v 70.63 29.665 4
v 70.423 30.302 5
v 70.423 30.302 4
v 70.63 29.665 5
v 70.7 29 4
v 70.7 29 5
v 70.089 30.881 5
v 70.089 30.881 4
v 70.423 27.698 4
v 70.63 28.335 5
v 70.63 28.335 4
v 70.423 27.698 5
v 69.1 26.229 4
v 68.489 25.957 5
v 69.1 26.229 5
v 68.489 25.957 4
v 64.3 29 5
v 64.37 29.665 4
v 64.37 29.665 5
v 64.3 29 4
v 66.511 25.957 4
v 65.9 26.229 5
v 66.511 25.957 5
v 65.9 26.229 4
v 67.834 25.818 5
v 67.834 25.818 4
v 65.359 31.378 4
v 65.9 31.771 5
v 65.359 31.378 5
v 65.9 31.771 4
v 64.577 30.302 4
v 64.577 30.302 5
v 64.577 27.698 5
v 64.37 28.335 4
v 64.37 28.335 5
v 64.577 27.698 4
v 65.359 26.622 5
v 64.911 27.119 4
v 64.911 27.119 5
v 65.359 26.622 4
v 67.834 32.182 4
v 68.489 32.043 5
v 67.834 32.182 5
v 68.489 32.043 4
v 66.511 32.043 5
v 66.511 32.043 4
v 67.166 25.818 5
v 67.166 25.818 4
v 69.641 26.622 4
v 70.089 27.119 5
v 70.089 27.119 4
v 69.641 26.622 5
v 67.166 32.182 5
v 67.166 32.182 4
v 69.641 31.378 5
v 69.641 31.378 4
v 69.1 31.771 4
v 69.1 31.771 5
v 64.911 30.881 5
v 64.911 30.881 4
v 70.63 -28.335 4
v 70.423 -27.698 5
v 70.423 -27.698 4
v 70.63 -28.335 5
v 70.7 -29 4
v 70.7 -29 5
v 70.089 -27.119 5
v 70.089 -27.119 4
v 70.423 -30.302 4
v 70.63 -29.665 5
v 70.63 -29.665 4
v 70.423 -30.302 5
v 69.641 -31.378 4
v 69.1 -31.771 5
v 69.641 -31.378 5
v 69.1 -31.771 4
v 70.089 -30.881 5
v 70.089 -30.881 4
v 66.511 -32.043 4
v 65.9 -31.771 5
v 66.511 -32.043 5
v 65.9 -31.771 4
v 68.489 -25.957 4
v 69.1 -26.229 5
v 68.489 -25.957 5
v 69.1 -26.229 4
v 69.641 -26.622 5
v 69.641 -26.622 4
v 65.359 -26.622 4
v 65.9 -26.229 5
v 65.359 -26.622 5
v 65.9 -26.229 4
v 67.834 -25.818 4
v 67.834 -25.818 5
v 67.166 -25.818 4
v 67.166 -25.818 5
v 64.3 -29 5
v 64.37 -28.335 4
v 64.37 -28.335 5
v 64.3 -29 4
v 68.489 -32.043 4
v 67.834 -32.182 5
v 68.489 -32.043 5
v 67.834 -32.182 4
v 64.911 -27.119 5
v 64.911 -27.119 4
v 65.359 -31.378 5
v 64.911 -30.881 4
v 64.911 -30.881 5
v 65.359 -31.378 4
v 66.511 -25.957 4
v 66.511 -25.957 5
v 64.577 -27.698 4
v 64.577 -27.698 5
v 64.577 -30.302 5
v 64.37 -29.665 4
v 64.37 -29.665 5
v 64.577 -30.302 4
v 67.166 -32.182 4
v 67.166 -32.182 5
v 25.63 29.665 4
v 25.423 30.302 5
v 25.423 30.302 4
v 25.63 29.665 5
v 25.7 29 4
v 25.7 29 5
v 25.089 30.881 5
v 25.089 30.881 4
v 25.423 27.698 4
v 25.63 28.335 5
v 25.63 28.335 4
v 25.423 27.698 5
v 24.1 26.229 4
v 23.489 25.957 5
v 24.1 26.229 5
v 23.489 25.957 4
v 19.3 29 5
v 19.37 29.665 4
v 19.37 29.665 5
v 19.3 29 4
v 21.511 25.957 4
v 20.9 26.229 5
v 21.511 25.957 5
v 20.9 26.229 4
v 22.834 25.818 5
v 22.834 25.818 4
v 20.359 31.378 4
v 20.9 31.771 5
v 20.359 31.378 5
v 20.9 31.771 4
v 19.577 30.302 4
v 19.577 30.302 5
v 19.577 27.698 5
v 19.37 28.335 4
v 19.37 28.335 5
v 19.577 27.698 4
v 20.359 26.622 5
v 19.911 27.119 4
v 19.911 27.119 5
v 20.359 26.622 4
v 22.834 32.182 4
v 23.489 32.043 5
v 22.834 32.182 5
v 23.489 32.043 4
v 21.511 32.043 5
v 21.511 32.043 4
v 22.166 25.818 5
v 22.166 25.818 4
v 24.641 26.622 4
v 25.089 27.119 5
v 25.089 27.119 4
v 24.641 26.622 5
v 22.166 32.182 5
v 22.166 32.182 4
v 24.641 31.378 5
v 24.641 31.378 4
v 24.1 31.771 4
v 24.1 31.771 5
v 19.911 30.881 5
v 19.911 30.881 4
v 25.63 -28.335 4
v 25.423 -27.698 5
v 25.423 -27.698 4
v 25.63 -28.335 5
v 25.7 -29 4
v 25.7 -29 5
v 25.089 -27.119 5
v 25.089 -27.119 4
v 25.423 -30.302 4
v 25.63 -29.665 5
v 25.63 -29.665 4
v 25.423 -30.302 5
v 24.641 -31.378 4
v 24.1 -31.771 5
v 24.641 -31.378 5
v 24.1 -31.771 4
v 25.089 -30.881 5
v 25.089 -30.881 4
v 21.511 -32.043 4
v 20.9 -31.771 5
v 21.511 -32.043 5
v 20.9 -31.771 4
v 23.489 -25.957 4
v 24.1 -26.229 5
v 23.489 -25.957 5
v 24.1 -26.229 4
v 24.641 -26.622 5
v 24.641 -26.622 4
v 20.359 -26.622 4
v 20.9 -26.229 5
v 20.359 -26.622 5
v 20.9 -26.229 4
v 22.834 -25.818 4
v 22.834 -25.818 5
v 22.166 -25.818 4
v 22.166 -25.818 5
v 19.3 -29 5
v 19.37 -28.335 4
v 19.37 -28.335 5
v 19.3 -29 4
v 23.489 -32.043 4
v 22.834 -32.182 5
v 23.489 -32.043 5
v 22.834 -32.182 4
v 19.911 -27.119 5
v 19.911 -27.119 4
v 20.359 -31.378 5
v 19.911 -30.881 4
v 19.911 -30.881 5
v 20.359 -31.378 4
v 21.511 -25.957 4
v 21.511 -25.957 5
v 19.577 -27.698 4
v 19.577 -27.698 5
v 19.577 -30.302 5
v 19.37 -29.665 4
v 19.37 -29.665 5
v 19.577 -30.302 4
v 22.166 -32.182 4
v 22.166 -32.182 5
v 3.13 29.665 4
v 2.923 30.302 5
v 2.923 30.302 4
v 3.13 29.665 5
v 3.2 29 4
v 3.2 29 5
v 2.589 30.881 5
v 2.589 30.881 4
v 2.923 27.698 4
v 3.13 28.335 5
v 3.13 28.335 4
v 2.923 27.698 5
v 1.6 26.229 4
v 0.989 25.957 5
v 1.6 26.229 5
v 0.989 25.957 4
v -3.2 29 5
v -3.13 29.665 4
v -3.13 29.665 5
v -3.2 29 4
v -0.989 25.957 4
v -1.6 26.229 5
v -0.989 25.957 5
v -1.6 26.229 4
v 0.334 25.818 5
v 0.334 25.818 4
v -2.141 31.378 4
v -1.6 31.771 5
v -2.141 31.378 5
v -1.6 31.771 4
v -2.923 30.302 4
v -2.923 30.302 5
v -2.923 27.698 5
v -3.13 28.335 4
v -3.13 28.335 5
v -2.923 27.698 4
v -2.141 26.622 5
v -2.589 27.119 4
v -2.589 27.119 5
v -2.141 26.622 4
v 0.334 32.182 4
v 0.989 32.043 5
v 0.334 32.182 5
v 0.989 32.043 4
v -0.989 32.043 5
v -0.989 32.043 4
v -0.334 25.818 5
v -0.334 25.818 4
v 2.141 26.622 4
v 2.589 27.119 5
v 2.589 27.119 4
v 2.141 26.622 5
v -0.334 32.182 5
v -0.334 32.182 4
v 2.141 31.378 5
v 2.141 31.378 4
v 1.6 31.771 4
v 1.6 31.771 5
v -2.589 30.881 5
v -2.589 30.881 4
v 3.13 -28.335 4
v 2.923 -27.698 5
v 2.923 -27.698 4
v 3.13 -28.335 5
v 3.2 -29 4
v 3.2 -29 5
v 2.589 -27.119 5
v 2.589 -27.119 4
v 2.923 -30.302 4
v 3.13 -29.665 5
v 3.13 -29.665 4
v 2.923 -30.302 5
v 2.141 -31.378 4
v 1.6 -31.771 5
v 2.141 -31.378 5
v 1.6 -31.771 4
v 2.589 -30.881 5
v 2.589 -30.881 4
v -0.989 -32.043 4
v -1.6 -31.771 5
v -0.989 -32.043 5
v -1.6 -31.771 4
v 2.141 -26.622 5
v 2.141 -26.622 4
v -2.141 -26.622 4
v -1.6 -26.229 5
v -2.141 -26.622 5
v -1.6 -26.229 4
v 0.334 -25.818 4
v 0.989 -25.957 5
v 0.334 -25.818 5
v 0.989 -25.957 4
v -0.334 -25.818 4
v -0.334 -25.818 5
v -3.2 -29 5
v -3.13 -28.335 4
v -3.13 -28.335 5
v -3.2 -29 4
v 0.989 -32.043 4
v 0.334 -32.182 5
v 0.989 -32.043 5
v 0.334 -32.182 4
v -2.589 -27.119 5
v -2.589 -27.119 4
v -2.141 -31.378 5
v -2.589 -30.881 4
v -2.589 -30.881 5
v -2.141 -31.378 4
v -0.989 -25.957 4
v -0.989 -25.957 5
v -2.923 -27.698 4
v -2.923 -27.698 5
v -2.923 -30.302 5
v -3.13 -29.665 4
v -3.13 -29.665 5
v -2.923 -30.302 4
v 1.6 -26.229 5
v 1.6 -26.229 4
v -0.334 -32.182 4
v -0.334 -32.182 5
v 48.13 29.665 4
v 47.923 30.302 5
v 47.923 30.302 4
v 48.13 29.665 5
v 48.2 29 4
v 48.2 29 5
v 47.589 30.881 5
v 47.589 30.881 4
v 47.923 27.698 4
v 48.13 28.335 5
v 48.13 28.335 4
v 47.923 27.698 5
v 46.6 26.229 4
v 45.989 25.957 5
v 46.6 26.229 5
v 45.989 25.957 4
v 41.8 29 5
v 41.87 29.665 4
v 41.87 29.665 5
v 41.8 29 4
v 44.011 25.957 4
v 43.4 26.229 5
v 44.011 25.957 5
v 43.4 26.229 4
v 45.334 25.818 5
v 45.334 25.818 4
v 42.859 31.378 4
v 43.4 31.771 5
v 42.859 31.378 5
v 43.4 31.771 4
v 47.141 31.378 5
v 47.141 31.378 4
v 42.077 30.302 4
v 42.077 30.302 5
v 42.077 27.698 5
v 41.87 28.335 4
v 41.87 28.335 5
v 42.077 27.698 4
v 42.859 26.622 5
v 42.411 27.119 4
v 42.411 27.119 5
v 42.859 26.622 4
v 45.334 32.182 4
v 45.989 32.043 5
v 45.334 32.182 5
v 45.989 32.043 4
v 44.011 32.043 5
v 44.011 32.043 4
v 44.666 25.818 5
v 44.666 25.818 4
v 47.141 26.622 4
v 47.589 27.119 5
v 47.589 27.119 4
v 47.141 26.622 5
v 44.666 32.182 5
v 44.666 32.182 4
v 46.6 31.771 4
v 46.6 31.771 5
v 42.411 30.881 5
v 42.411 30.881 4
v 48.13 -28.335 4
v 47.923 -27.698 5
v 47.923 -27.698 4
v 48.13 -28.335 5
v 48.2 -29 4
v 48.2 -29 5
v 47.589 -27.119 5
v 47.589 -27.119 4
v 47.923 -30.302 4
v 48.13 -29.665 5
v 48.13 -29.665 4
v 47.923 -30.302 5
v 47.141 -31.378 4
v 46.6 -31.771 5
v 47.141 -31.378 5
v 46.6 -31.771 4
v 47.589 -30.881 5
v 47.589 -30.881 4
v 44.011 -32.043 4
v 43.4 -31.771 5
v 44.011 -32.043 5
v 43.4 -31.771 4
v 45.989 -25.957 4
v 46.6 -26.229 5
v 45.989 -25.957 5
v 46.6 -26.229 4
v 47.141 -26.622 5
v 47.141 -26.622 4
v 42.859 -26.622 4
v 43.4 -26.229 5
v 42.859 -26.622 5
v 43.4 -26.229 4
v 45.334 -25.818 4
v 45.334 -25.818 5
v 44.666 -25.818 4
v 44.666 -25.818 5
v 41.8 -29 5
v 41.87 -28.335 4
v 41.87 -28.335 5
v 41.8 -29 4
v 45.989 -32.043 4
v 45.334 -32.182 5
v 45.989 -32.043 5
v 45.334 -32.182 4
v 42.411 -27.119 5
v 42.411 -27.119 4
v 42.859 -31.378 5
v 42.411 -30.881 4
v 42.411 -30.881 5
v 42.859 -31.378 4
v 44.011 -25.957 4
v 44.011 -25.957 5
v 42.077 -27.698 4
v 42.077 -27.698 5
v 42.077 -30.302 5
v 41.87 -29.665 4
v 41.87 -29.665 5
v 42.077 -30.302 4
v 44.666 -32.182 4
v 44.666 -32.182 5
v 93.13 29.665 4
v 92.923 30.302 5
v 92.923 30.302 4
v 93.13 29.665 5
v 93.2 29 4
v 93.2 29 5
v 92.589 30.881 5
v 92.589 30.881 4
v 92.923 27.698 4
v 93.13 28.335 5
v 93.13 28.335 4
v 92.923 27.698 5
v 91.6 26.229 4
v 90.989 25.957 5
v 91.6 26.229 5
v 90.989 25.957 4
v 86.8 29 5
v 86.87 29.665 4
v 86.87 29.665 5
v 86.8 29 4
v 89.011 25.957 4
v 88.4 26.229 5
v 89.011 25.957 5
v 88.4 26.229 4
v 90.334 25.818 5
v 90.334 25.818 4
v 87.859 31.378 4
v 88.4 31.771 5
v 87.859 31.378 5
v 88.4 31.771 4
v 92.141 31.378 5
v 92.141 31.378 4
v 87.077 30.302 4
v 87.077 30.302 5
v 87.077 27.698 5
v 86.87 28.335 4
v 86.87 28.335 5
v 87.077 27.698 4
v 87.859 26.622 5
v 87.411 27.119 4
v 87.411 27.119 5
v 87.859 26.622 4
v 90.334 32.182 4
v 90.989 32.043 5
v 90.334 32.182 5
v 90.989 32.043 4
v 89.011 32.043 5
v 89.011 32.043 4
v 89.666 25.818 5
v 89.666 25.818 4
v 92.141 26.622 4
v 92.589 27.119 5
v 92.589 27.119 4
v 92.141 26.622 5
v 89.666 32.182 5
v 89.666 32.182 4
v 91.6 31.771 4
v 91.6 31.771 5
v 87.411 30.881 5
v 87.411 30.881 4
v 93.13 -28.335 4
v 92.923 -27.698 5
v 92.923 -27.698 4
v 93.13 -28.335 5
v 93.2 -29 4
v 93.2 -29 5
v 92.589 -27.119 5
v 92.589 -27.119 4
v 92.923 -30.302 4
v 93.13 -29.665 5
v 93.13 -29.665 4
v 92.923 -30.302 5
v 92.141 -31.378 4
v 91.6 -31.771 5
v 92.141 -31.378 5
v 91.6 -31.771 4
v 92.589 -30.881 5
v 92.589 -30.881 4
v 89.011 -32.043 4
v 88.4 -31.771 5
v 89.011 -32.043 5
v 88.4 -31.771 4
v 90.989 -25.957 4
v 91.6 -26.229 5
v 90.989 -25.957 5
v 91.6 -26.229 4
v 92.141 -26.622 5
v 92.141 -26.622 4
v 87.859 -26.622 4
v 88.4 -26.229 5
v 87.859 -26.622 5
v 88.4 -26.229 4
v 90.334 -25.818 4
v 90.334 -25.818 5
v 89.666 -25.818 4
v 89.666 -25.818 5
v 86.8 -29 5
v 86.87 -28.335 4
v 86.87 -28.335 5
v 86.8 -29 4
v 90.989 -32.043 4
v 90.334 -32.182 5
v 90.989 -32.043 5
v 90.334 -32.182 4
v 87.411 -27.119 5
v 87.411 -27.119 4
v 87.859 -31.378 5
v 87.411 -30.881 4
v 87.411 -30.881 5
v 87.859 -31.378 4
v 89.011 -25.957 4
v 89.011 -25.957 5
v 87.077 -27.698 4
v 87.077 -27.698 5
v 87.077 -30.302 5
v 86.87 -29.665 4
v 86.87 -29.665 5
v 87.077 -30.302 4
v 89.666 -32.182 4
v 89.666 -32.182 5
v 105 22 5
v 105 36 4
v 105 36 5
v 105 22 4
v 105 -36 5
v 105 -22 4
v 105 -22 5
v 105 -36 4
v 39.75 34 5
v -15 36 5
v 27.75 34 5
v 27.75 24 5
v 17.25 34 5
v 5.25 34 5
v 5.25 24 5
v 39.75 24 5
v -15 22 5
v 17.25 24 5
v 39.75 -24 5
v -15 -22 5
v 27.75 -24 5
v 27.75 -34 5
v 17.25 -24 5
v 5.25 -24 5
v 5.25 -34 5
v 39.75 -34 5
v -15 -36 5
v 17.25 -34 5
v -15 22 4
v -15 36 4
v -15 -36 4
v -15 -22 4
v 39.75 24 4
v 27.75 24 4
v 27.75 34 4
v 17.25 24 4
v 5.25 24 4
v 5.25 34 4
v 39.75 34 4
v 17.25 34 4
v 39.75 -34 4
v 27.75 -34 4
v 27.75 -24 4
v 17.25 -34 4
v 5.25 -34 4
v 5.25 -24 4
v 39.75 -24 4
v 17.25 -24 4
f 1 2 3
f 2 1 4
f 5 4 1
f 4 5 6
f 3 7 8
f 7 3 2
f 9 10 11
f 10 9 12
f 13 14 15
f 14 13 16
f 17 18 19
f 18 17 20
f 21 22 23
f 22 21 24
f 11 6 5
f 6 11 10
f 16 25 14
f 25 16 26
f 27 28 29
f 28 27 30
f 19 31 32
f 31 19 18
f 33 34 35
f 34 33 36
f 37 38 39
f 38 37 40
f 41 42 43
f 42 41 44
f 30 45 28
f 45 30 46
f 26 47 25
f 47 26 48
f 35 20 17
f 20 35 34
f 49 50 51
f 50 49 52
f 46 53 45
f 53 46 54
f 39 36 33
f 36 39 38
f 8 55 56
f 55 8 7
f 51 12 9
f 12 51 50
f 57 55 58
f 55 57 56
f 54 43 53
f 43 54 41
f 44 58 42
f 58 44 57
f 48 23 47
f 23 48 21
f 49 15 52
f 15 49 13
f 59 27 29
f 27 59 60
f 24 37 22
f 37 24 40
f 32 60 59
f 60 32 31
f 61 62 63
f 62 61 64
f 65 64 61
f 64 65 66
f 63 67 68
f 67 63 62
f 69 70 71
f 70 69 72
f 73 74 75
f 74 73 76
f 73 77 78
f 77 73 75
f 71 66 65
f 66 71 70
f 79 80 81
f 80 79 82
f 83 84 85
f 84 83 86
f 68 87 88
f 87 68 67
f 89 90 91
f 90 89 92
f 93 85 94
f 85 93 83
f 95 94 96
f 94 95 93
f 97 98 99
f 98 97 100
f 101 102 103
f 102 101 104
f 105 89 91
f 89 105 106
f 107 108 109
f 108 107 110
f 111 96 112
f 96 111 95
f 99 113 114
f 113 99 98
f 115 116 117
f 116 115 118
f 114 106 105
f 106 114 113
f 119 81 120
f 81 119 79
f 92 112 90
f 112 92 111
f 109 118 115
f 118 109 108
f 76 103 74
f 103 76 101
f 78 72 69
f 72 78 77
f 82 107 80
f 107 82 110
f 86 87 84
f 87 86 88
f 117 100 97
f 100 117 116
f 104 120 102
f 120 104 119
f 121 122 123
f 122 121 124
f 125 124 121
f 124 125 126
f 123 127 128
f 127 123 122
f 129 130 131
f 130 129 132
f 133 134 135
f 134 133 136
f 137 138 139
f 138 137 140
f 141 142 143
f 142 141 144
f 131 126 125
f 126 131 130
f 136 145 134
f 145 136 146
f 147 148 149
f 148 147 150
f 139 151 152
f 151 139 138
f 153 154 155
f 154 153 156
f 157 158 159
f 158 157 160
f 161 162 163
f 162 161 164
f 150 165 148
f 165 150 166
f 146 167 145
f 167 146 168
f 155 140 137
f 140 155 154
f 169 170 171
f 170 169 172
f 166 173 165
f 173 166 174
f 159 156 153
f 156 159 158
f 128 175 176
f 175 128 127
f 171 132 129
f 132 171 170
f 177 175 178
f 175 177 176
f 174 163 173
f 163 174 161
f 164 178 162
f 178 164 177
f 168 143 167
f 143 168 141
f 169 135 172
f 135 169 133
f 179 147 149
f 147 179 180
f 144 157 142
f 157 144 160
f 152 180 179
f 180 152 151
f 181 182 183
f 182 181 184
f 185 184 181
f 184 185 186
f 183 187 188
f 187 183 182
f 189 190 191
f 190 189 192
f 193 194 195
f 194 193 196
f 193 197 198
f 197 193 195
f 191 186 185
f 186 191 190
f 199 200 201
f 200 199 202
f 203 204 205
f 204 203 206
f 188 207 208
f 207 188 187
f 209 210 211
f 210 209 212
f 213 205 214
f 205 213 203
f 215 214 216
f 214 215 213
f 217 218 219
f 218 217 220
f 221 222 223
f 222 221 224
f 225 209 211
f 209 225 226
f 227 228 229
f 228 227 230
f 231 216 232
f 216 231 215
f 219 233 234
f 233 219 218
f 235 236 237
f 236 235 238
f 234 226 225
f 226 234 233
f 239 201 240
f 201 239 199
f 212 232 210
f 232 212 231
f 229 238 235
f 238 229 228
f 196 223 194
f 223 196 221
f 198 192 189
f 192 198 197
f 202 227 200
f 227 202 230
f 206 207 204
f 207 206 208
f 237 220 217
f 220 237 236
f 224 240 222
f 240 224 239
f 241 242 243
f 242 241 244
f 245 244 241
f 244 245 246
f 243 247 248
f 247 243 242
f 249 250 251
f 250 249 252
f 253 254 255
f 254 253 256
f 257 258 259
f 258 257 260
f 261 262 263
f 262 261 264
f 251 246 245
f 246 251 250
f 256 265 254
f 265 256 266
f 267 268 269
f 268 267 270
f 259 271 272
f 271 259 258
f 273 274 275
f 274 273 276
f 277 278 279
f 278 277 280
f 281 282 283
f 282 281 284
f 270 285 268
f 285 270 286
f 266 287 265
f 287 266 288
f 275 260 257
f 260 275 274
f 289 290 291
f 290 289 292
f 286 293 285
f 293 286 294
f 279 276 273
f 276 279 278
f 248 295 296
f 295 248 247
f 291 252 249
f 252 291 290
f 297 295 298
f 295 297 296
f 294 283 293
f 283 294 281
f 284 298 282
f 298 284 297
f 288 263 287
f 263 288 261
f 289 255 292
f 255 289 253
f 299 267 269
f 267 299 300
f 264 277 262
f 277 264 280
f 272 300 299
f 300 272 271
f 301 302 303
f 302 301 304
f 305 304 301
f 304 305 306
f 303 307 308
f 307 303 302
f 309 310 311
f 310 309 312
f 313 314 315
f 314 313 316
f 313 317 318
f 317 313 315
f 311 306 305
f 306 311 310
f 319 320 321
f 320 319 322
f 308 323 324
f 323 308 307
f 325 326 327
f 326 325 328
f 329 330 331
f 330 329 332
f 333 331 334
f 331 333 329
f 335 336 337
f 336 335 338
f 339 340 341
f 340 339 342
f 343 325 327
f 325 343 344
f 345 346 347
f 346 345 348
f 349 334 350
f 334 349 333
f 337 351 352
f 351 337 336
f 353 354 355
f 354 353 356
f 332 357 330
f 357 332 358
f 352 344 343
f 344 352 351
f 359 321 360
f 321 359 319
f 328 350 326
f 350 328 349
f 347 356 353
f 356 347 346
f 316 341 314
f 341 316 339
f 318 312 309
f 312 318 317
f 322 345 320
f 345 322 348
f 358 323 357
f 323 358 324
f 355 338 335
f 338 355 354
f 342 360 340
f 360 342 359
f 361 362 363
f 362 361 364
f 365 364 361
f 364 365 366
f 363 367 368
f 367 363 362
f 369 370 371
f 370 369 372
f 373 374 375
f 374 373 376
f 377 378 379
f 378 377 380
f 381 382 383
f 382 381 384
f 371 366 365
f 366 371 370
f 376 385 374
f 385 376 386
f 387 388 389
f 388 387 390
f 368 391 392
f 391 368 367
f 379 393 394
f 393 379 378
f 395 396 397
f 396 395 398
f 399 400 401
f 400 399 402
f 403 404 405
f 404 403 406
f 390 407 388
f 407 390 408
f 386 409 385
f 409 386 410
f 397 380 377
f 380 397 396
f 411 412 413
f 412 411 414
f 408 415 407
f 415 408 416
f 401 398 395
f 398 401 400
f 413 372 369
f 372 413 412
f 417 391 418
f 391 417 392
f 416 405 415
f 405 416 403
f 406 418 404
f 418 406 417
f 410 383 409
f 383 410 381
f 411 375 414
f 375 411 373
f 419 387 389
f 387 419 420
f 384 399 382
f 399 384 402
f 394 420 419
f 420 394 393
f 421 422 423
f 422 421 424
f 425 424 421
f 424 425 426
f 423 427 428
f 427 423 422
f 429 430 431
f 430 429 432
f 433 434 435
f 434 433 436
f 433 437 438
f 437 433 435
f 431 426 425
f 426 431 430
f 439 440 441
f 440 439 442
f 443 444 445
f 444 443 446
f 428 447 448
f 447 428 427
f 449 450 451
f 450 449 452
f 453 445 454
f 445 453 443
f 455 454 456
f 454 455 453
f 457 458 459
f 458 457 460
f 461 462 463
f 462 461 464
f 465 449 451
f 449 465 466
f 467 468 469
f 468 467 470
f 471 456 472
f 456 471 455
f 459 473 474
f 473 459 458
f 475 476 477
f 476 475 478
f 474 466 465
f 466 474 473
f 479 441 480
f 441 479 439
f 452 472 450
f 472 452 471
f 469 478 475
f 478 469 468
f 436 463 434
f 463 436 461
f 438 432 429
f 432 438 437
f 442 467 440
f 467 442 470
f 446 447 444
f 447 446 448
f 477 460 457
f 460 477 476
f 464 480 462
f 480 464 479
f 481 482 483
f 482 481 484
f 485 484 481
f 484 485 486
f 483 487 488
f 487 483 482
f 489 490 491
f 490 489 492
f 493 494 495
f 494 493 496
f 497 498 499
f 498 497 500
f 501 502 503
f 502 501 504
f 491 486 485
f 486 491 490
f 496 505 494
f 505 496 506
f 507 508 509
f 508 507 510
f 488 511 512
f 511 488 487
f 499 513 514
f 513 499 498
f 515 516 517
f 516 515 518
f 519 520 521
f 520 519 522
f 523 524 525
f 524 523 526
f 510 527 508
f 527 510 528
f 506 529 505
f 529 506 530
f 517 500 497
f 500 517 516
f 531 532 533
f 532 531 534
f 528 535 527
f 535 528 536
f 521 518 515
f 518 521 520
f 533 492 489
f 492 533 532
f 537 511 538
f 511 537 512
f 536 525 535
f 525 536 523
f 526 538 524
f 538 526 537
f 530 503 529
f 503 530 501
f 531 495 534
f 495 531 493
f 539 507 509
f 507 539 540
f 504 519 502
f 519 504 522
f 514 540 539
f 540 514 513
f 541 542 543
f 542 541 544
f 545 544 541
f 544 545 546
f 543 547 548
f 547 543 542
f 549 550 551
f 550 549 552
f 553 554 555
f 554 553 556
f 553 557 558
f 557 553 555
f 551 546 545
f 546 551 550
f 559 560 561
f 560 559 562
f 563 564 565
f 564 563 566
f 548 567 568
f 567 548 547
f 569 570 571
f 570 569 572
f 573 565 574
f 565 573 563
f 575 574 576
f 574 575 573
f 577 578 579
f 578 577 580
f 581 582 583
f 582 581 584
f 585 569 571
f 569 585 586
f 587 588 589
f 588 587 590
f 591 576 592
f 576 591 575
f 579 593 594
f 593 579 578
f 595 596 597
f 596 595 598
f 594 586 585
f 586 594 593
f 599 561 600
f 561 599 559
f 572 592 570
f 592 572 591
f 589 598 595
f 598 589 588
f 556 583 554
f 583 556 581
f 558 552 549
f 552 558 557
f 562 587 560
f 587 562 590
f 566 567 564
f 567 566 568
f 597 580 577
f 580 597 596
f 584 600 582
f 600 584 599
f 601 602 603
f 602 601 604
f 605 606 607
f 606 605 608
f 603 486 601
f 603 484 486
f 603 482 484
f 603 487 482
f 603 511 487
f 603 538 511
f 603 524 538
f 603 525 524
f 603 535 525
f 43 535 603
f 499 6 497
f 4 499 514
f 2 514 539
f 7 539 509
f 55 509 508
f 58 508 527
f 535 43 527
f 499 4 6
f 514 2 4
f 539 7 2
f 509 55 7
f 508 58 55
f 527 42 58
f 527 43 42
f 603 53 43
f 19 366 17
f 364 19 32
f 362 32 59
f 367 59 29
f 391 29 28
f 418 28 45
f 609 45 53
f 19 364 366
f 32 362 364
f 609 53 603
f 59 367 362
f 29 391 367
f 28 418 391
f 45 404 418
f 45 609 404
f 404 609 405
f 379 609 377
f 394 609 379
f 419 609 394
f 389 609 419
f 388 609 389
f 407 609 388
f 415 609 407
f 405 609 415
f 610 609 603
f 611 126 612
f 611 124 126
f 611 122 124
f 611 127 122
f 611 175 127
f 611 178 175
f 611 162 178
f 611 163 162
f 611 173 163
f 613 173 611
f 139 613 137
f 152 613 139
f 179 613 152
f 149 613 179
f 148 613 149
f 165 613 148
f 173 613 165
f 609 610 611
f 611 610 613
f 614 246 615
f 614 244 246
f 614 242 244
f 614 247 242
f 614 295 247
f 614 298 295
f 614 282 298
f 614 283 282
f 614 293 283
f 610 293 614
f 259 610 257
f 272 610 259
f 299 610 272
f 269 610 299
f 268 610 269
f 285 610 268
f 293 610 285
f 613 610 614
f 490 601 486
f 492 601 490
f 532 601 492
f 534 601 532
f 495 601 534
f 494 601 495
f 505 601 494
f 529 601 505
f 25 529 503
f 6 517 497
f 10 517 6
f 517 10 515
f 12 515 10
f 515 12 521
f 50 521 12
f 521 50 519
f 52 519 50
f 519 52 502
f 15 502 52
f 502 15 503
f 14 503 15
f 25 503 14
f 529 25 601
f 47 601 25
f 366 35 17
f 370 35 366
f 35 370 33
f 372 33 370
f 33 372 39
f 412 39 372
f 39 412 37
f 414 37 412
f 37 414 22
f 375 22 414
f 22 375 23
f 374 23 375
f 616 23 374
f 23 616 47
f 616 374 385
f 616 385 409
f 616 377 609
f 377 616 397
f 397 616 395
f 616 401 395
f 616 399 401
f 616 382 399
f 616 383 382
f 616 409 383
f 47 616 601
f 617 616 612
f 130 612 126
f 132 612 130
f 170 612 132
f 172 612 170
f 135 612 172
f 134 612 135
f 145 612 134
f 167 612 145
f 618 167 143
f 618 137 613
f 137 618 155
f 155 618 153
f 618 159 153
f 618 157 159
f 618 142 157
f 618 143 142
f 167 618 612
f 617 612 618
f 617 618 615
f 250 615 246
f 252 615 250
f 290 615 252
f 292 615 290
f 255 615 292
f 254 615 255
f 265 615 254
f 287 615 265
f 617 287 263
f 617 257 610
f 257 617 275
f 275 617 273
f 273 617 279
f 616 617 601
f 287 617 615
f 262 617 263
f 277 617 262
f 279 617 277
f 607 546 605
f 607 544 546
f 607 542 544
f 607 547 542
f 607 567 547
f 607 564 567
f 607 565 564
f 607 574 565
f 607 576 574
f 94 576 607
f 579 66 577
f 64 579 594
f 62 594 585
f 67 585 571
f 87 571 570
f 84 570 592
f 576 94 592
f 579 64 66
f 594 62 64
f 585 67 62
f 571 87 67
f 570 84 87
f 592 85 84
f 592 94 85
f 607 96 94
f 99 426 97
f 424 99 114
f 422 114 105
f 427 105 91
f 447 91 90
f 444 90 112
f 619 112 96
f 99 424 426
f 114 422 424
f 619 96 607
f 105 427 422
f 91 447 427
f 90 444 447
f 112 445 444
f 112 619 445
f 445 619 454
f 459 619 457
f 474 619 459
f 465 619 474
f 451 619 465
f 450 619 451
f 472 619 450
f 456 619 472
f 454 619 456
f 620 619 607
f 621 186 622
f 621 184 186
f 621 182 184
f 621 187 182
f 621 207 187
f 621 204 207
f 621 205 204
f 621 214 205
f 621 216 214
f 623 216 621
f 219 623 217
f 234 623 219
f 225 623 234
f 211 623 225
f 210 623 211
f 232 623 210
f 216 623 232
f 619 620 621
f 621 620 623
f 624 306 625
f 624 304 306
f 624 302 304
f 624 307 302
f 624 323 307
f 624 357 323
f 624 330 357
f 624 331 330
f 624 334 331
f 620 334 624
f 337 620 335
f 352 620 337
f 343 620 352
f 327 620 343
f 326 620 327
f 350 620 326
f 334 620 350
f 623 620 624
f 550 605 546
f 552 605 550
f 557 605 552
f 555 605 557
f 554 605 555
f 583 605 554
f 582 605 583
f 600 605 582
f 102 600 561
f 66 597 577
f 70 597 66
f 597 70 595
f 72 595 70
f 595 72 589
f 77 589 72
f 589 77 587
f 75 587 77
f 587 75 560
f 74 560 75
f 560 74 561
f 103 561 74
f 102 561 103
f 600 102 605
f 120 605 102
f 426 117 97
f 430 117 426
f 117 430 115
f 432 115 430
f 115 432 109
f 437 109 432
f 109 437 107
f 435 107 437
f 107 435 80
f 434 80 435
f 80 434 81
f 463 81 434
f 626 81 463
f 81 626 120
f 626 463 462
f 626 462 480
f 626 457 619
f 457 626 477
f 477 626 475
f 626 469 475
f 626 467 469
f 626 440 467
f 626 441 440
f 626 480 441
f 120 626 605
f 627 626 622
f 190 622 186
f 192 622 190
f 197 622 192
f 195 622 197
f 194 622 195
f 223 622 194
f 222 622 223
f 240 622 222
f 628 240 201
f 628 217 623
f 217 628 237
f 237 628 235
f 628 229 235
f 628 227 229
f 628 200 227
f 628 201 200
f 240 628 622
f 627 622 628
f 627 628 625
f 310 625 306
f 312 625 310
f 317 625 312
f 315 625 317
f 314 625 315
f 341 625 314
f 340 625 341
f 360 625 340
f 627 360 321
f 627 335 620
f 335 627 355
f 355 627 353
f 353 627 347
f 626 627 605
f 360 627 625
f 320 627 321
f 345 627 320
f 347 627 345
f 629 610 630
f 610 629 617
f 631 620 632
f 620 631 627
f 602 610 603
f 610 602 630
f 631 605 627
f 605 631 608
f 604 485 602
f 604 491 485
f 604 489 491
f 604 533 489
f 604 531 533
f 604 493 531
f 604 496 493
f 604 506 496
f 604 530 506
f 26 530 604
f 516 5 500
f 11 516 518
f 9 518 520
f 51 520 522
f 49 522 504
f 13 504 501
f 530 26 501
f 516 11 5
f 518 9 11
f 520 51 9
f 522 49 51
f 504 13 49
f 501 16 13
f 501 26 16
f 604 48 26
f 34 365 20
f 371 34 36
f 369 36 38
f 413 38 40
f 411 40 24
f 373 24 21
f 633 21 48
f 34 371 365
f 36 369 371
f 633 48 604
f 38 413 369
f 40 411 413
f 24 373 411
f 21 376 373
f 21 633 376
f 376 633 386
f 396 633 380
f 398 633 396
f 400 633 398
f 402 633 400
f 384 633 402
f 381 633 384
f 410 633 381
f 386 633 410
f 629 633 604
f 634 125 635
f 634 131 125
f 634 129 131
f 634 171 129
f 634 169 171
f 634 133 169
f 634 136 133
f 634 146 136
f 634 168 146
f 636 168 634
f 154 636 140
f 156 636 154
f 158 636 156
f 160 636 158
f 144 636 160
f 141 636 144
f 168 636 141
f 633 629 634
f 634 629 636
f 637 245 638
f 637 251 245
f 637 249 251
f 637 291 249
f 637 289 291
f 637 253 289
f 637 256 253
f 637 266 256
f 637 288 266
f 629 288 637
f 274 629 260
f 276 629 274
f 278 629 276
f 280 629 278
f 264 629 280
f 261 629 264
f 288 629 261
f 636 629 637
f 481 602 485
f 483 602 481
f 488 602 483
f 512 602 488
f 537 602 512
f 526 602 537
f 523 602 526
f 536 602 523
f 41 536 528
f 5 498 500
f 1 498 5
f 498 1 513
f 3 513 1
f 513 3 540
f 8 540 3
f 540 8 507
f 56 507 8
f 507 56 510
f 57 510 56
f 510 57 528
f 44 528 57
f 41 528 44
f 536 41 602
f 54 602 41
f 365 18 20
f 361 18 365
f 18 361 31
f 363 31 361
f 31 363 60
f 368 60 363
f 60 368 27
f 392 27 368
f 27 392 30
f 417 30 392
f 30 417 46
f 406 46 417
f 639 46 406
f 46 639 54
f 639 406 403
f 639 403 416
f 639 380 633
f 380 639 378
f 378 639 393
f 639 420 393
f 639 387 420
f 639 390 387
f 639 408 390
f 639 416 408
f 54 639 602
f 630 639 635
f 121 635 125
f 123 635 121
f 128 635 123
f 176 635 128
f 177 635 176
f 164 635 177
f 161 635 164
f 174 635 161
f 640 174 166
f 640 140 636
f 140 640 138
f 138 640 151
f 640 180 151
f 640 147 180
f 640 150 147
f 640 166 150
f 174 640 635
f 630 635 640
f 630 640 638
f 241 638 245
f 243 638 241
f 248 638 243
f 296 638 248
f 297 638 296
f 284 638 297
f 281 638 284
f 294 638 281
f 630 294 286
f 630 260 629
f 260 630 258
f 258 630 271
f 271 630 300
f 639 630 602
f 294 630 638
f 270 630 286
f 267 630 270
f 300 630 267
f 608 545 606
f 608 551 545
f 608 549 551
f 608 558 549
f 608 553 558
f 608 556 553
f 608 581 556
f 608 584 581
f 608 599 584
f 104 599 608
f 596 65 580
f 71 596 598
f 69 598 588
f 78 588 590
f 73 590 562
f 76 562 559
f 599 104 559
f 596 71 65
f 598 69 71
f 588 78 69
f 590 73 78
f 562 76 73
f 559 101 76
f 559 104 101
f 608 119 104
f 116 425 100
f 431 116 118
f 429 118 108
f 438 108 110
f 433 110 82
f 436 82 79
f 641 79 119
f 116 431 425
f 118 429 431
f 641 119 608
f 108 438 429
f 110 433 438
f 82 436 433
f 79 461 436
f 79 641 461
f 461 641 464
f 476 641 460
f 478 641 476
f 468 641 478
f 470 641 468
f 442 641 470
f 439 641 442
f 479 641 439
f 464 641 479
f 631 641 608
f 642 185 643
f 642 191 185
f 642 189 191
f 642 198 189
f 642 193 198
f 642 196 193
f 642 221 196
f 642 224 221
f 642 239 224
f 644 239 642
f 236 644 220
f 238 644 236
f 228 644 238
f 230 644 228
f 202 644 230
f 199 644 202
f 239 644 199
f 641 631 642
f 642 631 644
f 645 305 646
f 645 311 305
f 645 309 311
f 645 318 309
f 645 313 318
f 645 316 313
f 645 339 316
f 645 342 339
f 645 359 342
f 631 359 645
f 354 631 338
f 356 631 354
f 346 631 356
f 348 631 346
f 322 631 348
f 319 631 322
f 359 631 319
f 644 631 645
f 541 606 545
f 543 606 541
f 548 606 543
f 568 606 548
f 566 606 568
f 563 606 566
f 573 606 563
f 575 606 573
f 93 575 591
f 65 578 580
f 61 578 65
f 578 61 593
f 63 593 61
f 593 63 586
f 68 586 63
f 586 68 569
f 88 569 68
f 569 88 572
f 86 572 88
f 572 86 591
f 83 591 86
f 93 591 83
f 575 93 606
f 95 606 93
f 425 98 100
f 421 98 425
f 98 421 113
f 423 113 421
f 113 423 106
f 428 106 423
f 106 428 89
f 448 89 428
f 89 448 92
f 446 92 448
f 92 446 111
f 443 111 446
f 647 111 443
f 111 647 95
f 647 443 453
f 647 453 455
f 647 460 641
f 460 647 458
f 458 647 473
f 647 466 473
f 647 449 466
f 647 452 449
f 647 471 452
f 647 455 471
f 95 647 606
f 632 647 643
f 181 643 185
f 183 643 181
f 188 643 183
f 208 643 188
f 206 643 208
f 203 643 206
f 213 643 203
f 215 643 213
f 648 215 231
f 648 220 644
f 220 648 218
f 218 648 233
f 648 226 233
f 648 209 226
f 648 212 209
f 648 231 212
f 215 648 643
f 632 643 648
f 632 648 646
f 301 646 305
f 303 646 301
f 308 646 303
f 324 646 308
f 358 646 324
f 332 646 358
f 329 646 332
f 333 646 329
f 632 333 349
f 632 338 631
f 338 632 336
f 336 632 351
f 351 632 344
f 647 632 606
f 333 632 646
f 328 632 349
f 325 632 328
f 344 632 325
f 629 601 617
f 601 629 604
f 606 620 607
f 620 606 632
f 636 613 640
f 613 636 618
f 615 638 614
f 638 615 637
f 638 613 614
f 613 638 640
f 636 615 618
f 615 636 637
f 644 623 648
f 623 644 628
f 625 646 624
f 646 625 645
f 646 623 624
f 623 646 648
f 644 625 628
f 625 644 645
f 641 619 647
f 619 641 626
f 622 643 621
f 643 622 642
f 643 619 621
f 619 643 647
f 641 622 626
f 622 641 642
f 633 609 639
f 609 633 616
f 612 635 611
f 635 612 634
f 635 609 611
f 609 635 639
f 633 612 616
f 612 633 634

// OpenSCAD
//Spacers.scad (c) by Embecosm Ltd.
//
//Spacers.scad is licensed under a
//Creative Commons Attribution-ShareAlike 4.0 International License.
//
//You should have received a copy of the license along with this
//work. If not, see <http://creativecommons.org/licenses/by-sa/4.0/>.

difference(){
    translate([45,0,0])
        cube([120,72,10],center=true);
    translate([45,0,-1])
        cube([120,72,10],center=true);
    translate([60,0,8])
        cube([160,44,10],center=true);
    translate([11.25,29,0])
        cube([12,10,15],center=true);
    translate([11.25,-29,0])
        cube([12,10,15],center=true);
    translate([33.75,-29,0])
        cube([12,10,17],center=true);
    translate([33.75,29,3])
        cube([12,10,16],center=true);
    cylinder(r=2.7, h=12, center=true, $fn=30);
    translate([0,7.62,0])
            cylinder(r=2.7, h=12, center=true, $fn=30);
    translate([0,-7.62,0])
            cylinder(r=2.7, h=12, center=true, $fn=30);
    translate([0,15.24,0])
            cylinder(r=2.7, h=12, center=true, $fn=30);
    translate([0,-15.24,0])
            cylinder(r=2.7, h=12, center=true, $fn=30);
    translate([67.5,0,0]){
        union(){
            translate([0,29,0])
                    cylinder(r=3.2, h=12, center=true, $fn=30);
            translate([0,-29,0])
                    cylinder(r=3.2, h=12, center=true, $fn=30);
            translate([0,29,8])
                    cylinder(r=3.2, h=12, center=true, $fn=30);
            translate([0,-29,8])
                    cylinder(r=3.2, h=12, center=true, $fn=30);
        };
    };
    translate([22.5,0,0]){
        union(){
            translate([0,29,0])
                    cylinder(r=3.2, h=12, center=true, $fn=30);
            translate([0,-29,0])
                    cylinder(r=3.2, h=12, center=true, $fn=30);
            translate([0,29,8])
                    cylinder(r=3.2, h=12, center=true, $fn=30);
            translate([0,-29,8])
                    cylinder(r=3.2, h=12, center=true, $fn=30);
        };
    };
    union(){
        translate([0,29,0])
                cylinder(r=3.2, h=12, center=true, $fn=30);
        translate([0,-29,0])
                cylinder(r=3.2, h=12, center=true, $fn=30);
        translate([0,29,-8])
                cylinder(r=3.2, h=12, center=true, $fn=30);
        translate([0,-29,-8])
                cylinder(r=3.2, h=12, center=true, $fn=30);
    };
    translate([45,0,0]){
        union(){
            translate([0,29,0])
                    cylinder(r=3.2, h=12, center=true, $fn=30);
            translate([0,-29,0])
                    cylinder(r=3.2, h=12, center=true, $fn=30);
            translate([0,29,-8])
                    cylinder(r=3.2, h=12, center=true, $fn=30);
            translate([0,-29,-8])
                    cylinder(r=3.2, h=12, center=true, $fn=30);
        };
    };
    translate([90,0,0]){
        union(){
            translate([0,29,0])
                    cylinder(r=3.2, h=12, center=true, $fn=30);
            translate([0,-29,0])
                    cylinder(r=3.2, h=12, center=true, $fn=30);
            translate([0,29,-8])
                    cylinder(r=3.2, h=12, center=true, $fn=30);
            translate([0,-29,-8])
                    cylinder(r=3.2, h=12, center=true, $fn=30);
        };
    };
};
